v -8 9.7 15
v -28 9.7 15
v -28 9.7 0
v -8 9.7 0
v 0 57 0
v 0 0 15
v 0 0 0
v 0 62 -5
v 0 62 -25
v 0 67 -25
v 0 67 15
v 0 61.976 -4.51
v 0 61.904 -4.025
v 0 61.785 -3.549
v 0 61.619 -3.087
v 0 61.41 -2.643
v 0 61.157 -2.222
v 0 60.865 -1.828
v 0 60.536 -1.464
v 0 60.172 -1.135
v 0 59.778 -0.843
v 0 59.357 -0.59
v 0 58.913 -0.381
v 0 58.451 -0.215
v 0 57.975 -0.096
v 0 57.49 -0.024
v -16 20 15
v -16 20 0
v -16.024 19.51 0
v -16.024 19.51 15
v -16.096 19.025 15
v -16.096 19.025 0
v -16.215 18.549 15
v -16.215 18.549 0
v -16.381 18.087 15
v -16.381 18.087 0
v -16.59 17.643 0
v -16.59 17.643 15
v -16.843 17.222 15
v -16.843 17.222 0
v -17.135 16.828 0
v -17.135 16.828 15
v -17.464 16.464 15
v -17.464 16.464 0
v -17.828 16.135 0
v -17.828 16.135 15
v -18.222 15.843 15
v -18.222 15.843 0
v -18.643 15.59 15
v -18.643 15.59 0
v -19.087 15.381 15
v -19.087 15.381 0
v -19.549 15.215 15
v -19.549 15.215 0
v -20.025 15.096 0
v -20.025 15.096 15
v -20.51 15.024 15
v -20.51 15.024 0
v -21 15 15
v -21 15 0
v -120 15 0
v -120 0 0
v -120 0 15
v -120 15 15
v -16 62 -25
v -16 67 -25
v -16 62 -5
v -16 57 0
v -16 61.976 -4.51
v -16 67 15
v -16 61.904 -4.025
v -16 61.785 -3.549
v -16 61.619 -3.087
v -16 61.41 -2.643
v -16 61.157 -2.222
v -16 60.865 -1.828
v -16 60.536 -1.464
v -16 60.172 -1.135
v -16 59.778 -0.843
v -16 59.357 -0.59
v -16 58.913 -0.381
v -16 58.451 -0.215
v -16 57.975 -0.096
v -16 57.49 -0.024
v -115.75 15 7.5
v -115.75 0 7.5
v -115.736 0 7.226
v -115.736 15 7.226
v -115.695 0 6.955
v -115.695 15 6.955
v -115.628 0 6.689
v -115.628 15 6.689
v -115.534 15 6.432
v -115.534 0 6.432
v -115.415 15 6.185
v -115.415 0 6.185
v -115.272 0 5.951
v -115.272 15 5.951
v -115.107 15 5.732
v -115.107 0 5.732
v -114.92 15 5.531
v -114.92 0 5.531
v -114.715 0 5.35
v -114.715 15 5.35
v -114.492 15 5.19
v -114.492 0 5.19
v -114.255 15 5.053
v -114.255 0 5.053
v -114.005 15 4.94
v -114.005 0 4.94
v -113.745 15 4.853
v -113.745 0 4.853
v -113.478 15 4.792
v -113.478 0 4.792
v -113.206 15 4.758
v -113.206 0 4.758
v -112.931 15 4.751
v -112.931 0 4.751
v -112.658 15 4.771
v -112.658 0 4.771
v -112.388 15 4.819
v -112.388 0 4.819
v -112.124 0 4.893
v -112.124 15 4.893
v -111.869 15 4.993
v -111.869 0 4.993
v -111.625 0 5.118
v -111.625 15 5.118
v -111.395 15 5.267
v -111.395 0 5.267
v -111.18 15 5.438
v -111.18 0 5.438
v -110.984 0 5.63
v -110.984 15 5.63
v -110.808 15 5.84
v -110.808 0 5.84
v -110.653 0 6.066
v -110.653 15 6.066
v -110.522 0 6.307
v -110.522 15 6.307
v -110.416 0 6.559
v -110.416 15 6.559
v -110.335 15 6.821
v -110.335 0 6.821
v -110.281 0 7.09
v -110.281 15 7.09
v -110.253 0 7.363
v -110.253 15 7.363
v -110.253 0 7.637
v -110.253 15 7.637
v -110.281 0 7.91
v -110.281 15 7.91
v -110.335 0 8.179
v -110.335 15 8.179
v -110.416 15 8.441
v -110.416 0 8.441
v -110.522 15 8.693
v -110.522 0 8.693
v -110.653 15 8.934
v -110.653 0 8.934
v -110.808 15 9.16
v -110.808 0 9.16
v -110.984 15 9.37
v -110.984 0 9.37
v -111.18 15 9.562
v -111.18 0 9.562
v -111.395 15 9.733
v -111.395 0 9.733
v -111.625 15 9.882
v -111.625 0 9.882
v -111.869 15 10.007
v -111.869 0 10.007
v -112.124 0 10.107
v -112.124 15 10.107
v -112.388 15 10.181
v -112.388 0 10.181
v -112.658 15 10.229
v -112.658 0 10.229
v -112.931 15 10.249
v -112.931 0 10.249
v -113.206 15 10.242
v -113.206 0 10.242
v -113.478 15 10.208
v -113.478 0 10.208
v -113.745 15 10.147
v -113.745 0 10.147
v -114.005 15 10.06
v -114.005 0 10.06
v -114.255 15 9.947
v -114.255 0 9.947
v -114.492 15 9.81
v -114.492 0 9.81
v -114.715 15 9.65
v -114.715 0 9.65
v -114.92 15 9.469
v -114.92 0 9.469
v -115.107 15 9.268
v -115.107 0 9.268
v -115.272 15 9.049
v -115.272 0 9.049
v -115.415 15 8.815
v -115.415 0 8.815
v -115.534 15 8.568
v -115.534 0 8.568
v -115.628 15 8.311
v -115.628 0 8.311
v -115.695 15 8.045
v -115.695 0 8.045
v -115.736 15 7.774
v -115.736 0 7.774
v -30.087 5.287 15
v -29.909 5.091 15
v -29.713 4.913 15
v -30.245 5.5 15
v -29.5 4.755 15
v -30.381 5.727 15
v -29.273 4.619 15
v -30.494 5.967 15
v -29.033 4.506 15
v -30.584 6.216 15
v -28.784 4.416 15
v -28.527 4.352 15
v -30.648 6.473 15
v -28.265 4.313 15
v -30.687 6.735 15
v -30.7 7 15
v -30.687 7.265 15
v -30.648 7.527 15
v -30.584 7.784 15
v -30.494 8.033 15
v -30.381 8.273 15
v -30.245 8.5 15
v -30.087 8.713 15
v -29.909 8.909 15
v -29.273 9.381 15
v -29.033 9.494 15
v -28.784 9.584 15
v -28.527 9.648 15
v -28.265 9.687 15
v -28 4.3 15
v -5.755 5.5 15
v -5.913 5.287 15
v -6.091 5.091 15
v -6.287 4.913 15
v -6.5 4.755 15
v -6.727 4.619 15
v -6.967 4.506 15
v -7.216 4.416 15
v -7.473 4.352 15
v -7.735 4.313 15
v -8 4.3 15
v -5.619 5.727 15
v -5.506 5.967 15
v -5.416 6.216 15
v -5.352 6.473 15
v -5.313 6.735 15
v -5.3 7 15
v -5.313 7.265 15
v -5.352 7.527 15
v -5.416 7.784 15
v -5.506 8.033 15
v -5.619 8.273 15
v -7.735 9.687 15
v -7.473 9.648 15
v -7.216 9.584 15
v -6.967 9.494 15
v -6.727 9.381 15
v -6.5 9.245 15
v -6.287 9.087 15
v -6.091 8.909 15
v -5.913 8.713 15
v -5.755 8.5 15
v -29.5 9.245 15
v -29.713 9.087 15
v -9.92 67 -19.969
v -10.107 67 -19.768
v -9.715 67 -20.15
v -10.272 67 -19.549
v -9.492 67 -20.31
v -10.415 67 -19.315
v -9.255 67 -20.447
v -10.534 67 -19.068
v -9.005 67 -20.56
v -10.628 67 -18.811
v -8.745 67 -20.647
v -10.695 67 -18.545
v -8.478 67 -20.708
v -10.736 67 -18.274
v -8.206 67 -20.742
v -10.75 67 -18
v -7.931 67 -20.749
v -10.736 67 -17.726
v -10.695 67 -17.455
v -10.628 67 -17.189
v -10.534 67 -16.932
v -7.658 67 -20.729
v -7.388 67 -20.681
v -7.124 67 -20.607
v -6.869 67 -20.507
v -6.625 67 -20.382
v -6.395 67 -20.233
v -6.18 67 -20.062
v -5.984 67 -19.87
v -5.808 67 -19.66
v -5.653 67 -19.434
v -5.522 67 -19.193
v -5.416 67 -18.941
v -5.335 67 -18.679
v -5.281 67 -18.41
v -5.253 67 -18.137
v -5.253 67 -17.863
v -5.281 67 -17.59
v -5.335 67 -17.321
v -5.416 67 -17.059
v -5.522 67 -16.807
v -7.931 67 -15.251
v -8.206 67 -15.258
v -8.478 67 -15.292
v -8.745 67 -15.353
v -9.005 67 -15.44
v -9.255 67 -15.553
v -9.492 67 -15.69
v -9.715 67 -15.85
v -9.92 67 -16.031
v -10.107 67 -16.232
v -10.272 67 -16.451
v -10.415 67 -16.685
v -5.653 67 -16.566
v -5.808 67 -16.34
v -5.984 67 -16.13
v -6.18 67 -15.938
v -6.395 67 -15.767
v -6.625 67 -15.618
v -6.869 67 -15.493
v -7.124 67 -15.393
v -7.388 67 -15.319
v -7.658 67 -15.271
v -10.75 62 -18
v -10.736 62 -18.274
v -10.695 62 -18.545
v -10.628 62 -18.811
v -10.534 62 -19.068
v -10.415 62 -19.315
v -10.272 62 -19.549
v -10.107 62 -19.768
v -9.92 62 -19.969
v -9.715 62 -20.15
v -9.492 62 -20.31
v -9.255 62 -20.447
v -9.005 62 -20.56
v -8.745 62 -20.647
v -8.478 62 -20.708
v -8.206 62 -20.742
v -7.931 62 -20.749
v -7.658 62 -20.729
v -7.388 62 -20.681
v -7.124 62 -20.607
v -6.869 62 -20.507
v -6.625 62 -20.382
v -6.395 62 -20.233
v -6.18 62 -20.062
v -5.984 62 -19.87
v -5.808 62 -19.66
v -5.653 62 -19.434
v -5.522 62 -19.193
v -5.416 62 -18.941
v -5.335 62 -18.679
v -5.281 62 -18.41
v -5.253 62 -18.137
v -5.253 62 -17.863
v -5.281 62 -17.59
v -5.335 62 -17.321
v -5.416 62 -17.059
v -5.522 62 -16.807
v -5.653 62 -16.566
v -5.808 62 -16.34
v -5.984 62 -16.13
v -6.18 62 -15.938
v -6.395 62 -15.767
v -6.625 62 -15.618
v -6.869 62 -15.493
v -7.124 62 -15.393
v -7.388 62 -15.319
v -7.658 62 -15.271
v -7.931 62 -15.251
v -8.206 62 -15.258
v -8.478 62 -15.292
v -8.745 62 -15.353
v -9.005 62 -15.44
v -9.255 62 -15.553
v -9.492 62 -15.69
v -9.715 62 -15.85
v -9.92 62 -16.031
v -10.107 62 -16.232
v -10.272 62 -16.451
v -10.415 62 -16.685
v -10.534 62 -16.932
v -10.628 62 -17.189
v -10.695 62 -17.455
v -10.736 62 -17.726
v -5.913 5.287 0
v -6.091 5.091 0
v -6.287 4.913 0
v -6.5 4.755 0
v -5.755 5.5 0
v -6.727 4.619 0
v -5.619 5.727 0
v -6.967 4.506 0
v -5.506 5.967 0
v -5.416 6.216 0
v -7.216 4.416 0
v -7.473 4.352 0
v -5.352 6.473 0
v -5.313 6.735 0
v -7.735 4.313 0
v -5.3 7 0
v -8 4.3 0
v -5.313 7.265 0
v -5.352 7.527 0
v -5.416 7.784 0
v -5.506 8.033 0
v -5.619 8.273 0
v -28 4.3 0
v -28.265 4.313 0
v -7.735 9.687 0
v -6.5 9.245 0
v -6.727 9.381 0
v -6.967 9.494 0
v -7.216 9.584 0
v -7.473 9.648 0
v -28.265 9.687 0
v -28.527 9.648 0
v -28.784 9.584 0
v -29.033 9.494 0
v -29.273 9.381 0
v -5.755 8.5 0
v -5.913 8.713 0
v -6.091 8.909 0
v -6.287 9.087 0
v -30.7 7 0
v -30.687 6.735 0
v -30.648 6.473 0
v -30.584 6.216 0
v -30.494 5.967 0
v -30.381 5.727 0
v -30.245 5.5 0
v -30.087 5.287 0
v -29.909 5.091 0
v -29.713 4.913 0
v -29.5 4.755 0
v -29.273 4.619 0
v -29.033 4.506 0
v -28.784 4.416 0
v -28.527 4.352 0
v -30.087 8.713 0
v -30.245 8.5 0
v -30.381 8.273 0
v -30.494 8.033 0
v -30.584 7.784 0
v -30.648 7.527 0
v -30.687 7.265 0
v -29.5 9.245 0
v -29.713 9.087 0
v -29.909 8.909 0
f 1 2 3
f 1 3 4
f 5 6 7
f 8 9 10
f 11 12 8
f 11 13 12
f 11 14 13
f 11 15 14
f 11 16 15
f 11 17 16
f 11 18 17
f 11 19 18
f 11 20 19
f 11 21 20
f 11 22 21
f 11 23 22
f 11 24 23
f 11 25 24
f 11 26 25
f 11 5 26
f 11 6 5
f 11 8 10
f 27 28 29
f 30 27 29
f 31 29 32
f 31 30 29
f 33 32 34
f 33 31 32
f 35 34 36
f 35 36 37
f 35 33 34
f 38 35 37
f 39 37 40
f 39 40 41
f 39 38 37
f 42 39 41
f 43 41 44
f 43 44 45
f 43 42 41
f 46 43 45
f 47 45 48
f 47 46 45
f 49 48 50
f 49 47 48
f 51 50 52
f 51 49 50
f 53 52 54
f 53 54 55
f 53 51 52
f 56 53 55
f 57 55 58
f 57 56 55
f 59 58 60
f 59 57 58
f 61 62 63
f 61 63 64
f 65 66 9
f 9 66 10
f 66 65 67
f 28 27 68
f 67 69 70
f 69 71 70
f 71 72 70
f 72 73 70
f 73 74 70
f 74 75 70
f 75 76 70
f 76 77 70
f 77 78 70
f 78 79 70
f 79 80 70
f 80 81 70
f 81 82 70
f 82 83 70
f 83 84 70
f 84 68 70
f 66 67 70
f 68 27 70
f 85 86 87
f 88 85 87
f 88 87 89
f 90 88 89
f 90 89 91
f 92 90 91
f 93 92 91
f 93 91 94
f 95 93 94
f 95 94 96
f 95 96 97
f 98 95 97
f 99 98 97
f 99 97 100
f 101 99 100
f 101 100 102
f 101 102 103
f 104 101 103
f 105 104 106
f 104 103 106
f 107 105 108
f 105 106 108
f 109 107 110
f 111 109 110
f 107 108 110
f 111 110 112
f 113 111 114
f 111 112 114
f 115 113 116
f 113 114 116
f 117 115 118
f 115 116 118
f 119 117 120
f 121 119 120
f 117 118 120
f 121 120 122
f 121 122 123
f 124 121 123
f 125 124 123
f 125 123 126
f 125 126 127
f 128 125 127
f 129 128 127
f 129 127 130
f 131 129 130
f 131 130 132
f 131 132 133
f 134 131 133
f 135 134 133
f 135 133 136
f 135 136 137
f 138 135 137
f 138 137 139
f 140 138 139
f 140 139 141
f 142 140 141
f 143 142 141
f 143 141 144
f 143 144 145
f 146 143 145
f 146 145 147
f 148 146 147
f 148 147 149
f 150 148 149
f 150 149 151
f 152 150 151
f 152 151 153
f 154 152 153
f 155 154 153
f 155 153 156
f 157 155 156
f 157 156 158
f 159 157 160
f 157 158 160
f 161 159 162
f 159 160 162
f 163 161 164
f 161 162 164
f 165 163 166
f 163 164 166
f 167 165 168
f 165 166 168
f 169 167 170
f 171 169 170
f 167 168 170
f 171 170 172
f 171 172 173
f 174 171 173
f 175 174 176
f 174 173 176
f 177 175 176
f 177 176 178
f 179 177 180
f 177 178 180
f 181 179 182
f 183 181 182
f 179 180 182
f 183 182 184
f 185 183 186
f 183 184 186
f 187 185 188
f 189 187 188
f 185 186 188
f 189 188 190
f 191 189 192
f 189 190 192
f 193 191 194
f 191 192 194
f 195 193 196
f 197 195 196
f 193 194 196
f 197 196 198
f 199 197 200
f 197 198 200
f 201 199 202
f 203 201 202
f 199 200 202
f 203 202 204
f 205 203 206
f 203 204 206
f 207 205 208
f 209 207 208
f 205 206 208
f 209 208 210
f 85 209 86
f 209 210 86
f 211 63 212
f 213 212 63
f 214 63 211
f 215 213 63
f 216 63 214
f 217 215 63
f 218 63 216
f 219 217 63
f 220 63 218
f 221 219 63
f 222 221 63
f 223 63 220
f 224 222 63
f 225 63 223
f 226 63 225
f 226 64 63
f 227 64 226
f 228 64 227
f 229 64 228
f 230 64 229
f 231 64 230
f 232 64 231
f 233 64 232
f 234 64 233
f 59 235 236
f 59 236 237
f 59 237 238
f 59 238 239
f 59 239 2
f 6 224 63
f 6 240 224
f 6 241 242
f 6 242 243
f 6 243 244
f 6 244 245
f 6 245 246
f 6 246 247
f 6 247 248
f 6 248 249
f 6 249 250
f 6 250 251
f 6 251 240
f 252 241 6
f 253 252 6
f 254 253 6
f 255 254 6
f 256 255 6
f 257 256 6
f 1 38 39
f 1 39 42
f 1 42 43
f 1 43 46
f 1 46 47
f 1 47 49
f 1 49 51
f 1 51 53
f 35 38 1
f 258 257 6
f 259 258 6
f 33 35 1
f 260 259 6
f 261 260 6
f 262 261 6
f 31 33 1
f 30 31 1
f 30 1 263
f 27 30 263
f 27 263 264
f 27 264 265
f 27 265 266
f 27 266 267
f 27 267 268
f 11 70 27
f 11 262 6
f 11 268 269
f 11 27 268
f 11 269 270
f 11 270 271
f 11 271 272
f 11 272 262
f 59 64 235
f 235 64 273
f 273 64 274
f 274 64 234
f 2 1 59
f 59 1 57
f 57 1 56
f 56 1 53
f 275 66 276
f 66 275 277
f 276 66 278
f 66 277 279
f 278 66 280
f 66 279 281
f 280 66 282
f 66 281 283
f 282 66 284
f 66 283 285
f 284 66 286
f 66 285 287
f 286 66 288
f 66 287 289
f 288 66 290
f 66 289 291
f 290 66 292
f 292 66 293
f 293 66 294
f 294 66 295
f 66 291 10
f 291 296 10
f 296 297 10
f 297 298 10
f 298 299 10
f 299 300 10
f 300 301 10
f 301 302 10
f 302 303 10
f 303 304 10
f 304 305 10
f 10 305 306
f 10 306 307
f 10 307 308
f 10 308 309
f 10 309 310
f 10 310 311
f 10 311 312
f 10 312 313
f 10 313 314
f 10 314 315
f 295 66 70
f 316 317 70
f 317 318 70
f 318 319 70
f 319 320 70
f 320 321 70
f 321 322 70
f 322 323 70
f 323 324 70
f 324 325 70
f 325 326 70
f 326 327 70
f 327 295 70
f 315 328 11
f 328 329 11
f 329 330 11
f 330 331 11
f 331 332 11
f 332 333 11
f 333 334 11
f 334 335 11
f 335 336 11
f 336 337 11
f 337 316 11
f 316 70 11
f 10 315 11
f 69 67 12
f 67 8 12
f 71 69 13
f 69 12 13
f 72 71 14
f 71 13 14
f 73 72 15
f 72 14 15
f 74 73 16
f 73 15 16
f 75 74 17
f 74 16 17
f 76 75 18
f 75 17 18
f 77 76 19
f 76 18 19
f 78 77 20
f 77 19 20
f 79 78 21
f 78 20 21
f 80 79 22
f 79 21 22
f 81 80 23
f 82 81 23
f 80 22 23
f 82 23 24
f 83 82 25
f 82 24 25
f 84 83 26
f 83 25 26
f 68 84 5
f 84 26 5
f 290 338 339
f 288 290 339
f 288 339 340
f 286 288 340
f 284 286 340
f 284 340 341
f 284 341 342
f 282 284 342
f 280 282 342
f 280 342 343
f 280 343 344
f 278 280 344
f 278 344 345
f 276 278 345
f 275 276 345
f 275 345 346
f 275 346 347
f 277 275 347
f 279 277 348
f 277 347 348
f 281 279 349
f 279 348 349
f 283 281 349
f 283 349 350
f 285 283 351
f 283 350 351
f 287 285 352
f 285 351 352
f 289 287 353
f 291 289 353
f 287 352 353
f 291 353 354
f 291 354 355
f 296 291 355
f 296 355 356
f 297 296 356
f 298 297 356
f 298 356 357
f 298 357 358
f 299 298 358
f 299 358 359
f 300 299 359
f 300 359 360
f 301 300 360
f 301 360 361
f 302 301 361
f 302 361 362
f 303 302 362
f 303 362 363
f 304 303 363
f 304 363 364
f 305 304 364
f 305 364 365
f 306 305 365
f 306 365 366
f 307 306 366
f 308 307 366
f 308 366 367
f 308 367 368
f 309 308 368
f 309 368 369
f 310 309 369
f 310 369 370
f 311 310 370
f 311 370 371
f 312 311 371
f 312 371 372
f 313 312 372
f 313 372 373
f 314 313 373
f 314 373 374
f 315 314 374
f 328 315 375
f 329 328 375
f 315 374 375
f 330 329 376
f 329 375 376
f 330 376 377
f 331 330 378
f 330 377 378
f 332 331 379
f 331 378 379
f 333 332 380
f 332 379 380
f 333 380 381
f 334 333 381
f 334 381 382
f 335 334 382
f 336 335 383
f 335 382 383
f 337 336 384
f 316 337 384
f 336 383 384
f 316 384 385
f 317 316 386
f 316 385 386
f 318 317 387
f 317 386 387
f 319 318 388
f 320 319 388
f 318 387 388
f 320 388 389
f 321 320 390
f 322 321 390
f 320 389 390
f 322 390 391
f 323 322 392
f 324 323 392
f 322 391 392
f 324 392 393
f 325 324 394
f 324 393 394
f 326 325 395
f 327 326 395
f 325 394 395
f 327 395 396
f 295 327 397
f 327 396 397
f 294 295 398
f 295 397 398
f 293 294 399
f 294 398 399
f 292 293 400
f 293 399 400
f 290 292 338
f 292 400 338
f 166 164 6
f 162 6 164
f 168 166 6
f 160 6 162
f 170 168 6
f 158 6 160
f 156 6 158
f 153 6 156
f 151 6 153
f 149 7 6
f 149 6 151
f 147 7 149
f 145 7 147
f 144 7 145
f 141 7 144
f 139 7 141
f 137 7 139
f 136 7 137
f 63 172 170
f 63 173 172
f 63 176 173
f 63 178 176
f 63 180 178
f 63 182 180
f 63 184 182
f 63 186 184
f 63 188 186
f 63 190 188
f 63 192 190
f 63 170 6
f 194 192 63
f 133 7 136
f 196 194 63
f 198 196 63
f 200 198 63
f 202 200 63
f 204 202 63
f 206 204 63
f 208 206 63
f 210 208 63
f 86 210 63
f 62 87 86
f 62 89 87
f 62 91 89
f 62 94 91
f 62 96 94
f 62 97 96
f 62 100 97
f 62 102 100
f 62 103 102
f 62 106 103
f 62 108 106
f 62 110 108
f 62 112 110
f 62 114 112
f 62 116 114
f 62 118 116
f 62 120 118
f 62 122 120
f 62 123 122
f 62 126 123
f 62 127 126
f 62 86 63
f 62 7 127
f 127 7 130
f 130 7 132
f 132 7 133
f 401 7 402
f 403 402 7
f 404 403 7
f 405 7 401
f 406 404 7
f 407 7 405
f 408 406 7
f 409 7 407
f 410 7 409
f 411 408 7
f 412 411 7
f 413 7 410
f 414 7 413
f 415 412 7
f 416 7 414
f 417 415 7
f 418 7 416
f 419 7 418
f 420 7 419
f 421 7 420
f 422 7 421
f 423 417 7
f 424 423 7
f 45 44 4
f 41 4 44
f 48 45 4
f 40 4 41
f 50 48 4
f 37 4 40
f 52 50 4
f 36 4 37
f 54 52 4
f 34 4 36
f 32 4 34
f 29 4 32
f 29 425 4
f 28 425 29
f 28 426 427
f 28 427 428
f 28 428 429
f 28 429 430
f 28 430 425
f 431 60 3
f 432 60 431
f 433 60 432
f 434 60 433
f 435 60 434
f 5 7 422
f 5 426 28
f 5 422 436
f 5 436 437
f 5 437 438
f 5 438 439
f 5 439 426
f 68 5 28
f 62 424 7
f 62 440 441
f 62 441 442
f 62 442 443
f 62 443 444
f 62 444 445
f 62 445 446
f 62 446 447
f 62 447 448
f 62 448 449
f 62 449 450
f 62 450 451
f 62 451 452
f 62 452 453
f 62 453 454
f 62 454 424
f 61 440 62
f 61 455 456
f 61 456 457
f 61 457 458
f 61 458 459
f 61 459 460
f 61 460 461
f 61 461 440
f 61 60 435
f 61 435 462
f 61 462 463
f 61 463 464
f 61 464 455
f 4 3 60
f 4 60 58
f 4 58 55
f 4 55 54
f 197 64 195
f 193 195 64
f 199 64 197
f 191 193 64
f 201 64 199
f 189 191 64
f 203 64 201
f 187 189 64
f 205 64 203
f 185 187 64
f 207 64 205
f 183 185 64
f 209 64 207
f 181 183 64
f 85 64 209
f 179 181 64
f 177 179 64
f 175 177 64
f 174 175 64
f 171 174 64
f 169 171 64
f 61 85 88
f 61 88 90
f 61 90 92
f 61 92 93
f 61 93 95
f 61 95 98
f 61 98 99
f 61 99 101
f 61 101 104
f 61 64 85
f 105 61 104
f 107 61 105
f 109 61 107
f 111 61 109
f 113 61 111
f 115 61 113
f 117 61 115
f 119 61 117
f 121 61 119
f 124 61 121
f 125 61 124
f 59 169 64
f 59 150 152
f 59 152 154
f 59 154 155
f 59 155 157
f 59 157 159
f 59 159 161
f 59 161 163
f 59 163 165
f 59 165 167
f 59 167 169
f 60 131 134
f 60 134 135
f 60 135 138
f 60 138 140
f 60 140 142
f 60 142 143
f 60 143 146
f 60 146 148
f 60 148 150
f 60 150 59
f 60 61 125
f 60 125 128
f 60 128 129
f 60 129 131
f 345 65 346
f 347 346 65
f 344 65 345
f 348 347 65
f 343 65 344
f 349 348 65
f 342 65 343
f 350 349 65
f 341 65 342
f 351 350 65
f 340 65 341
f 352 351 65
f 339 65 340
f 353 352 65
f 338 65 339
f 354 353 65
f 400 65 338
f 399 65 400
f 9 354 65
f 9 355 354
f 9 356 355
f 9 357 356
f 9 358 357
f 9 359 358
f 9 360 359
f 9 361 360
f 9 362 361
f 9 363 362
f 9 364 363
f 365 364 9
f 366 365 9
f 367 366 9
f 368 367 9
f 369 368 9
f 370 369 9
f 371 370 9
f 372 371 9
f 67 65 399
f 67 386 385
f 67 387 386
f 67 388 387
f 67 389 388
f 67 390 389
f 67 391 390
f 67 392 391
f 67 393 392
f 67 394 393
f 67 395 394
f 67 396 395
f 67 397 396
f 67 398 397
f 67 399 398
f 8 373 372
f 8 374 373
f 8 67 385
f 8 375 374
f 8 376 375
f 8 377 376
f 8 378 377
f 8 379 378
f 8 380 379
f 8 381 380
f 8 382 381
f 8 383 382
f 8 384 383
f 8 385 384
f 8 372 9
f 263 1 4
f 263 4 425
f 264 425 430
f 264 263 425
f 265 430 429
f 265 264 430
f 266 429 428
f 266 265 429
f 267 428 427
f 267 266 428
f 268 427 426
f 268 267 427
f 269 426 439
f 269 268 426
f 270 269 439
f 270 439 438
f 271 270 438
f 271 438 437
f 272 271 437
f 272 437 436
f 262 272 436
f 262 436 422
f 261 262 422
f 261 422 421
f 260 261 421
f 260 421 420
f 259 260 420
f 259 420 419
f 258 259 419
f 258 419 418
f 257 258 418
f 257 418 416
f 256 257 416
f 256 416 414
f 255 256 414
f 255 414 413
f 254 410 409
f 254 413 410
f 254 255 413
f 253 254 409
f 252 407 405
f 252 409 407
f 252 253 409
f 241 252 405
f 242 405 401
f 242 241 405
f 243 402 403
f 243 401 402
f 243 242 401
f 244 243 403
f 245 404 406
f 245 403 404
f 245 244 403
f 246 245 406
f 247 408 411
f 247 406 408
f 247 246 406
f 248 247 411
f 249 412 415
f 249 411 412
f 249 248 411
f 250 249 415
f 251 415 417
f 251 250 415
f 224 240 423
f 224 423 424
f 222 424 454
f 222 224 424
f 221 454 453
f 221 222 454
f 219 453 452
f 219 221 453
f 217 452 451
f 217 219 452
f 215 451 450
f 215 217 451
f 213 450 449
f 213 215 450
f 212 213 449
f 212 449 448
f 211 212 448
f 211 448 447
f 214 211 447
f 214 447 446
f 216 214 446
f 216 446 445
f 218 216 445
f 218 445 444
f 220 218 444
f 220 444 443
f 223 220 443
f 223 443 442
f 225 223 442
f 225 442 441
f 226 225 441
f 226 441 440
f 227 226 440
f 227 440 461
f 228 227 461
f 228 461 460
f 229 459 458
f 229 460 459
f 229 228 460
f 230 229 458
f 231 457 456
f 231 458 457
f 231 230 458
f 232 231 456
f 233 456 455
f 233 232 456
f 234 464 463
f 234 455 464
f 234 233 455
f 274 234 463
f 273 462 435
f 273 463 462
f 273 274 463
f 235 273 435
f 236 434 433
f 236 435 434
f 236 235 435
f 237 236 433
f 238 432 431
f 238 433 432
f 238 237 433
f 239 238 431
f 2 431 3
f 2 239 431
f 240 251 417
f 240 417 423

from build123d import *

# Parameters (mm, degrees)
BOSS_EXTRUDE1_DEPTH  = 15
SKETCH2_W            = 16
SKETCH2_H            = 5
BOSS_EXTRUDE2_DEPTH  = 40
CUT_EXTRUDE1_DEPTH   = 45
M5_CLEARANCE_HOLE1_D = 5.5
FILLET1_R            = 5


with BuildPart() as part:
    # Sketch1 → Boss-Extrude1 (new body)
    with BuildSketch(Plane.XY):
        Polygon((0, 0), (-120, 0), (-120, 15), (-16, 15), (-16, 62), (0, 62), align=None)
    extrude(amount=BOSS_EXTRUDE1_DEPTH)

    # Sketch2 → Boss-Extrude2 (add)
    with BuildSketch(Plane.XY.offset(15)):
        with Locations((-8, 64.5)):
            Rectangle(SKETCH2_W, SKETCH2_H)
    extrude(amount=-BOSS_EXTRUDE2_DEPTH)

    # Sketch3 → Cut-Extrude1 (cut)
    with BuildSketch(Plane.XY.offset(15)):
        with BuildLine():
            Line((-28, 9.7), (-8, 9.7))
            ThreePointArc((-8, 9.7), (-5.3, 7), (-8, 4.3))
            Line((-8, 4.3), (-28, 4.3))
            ThreePointArc((-28, 4.3), (-30.7, 7), (-28, 9.7))
        make_face()
    extrude(amount=-CUT_EXTRUDE1_DEPTH, mode=Mode.SUBTRACT)

    # M5 Clearance Hole1 (through all)
    with Locations(Plane(origin=(0, 67, 0), x_dir=(1, 0, 0), z_dir=(0, 1, 0))):
        with Locations((-8, 18), (-113, -7.5)):
            Hole(M5_CLEARANCE_HOLE1_D / 2)

    # Fillet1
    fillet1_edges = [part.edges().sort_by_distance(p)[0] for p in [
        (-16, 15, 7.5),
        (-8, 62, 0),
    ]]
    fillet(fillet1_edges, radius=FILLET1_R)


solid = part.part
